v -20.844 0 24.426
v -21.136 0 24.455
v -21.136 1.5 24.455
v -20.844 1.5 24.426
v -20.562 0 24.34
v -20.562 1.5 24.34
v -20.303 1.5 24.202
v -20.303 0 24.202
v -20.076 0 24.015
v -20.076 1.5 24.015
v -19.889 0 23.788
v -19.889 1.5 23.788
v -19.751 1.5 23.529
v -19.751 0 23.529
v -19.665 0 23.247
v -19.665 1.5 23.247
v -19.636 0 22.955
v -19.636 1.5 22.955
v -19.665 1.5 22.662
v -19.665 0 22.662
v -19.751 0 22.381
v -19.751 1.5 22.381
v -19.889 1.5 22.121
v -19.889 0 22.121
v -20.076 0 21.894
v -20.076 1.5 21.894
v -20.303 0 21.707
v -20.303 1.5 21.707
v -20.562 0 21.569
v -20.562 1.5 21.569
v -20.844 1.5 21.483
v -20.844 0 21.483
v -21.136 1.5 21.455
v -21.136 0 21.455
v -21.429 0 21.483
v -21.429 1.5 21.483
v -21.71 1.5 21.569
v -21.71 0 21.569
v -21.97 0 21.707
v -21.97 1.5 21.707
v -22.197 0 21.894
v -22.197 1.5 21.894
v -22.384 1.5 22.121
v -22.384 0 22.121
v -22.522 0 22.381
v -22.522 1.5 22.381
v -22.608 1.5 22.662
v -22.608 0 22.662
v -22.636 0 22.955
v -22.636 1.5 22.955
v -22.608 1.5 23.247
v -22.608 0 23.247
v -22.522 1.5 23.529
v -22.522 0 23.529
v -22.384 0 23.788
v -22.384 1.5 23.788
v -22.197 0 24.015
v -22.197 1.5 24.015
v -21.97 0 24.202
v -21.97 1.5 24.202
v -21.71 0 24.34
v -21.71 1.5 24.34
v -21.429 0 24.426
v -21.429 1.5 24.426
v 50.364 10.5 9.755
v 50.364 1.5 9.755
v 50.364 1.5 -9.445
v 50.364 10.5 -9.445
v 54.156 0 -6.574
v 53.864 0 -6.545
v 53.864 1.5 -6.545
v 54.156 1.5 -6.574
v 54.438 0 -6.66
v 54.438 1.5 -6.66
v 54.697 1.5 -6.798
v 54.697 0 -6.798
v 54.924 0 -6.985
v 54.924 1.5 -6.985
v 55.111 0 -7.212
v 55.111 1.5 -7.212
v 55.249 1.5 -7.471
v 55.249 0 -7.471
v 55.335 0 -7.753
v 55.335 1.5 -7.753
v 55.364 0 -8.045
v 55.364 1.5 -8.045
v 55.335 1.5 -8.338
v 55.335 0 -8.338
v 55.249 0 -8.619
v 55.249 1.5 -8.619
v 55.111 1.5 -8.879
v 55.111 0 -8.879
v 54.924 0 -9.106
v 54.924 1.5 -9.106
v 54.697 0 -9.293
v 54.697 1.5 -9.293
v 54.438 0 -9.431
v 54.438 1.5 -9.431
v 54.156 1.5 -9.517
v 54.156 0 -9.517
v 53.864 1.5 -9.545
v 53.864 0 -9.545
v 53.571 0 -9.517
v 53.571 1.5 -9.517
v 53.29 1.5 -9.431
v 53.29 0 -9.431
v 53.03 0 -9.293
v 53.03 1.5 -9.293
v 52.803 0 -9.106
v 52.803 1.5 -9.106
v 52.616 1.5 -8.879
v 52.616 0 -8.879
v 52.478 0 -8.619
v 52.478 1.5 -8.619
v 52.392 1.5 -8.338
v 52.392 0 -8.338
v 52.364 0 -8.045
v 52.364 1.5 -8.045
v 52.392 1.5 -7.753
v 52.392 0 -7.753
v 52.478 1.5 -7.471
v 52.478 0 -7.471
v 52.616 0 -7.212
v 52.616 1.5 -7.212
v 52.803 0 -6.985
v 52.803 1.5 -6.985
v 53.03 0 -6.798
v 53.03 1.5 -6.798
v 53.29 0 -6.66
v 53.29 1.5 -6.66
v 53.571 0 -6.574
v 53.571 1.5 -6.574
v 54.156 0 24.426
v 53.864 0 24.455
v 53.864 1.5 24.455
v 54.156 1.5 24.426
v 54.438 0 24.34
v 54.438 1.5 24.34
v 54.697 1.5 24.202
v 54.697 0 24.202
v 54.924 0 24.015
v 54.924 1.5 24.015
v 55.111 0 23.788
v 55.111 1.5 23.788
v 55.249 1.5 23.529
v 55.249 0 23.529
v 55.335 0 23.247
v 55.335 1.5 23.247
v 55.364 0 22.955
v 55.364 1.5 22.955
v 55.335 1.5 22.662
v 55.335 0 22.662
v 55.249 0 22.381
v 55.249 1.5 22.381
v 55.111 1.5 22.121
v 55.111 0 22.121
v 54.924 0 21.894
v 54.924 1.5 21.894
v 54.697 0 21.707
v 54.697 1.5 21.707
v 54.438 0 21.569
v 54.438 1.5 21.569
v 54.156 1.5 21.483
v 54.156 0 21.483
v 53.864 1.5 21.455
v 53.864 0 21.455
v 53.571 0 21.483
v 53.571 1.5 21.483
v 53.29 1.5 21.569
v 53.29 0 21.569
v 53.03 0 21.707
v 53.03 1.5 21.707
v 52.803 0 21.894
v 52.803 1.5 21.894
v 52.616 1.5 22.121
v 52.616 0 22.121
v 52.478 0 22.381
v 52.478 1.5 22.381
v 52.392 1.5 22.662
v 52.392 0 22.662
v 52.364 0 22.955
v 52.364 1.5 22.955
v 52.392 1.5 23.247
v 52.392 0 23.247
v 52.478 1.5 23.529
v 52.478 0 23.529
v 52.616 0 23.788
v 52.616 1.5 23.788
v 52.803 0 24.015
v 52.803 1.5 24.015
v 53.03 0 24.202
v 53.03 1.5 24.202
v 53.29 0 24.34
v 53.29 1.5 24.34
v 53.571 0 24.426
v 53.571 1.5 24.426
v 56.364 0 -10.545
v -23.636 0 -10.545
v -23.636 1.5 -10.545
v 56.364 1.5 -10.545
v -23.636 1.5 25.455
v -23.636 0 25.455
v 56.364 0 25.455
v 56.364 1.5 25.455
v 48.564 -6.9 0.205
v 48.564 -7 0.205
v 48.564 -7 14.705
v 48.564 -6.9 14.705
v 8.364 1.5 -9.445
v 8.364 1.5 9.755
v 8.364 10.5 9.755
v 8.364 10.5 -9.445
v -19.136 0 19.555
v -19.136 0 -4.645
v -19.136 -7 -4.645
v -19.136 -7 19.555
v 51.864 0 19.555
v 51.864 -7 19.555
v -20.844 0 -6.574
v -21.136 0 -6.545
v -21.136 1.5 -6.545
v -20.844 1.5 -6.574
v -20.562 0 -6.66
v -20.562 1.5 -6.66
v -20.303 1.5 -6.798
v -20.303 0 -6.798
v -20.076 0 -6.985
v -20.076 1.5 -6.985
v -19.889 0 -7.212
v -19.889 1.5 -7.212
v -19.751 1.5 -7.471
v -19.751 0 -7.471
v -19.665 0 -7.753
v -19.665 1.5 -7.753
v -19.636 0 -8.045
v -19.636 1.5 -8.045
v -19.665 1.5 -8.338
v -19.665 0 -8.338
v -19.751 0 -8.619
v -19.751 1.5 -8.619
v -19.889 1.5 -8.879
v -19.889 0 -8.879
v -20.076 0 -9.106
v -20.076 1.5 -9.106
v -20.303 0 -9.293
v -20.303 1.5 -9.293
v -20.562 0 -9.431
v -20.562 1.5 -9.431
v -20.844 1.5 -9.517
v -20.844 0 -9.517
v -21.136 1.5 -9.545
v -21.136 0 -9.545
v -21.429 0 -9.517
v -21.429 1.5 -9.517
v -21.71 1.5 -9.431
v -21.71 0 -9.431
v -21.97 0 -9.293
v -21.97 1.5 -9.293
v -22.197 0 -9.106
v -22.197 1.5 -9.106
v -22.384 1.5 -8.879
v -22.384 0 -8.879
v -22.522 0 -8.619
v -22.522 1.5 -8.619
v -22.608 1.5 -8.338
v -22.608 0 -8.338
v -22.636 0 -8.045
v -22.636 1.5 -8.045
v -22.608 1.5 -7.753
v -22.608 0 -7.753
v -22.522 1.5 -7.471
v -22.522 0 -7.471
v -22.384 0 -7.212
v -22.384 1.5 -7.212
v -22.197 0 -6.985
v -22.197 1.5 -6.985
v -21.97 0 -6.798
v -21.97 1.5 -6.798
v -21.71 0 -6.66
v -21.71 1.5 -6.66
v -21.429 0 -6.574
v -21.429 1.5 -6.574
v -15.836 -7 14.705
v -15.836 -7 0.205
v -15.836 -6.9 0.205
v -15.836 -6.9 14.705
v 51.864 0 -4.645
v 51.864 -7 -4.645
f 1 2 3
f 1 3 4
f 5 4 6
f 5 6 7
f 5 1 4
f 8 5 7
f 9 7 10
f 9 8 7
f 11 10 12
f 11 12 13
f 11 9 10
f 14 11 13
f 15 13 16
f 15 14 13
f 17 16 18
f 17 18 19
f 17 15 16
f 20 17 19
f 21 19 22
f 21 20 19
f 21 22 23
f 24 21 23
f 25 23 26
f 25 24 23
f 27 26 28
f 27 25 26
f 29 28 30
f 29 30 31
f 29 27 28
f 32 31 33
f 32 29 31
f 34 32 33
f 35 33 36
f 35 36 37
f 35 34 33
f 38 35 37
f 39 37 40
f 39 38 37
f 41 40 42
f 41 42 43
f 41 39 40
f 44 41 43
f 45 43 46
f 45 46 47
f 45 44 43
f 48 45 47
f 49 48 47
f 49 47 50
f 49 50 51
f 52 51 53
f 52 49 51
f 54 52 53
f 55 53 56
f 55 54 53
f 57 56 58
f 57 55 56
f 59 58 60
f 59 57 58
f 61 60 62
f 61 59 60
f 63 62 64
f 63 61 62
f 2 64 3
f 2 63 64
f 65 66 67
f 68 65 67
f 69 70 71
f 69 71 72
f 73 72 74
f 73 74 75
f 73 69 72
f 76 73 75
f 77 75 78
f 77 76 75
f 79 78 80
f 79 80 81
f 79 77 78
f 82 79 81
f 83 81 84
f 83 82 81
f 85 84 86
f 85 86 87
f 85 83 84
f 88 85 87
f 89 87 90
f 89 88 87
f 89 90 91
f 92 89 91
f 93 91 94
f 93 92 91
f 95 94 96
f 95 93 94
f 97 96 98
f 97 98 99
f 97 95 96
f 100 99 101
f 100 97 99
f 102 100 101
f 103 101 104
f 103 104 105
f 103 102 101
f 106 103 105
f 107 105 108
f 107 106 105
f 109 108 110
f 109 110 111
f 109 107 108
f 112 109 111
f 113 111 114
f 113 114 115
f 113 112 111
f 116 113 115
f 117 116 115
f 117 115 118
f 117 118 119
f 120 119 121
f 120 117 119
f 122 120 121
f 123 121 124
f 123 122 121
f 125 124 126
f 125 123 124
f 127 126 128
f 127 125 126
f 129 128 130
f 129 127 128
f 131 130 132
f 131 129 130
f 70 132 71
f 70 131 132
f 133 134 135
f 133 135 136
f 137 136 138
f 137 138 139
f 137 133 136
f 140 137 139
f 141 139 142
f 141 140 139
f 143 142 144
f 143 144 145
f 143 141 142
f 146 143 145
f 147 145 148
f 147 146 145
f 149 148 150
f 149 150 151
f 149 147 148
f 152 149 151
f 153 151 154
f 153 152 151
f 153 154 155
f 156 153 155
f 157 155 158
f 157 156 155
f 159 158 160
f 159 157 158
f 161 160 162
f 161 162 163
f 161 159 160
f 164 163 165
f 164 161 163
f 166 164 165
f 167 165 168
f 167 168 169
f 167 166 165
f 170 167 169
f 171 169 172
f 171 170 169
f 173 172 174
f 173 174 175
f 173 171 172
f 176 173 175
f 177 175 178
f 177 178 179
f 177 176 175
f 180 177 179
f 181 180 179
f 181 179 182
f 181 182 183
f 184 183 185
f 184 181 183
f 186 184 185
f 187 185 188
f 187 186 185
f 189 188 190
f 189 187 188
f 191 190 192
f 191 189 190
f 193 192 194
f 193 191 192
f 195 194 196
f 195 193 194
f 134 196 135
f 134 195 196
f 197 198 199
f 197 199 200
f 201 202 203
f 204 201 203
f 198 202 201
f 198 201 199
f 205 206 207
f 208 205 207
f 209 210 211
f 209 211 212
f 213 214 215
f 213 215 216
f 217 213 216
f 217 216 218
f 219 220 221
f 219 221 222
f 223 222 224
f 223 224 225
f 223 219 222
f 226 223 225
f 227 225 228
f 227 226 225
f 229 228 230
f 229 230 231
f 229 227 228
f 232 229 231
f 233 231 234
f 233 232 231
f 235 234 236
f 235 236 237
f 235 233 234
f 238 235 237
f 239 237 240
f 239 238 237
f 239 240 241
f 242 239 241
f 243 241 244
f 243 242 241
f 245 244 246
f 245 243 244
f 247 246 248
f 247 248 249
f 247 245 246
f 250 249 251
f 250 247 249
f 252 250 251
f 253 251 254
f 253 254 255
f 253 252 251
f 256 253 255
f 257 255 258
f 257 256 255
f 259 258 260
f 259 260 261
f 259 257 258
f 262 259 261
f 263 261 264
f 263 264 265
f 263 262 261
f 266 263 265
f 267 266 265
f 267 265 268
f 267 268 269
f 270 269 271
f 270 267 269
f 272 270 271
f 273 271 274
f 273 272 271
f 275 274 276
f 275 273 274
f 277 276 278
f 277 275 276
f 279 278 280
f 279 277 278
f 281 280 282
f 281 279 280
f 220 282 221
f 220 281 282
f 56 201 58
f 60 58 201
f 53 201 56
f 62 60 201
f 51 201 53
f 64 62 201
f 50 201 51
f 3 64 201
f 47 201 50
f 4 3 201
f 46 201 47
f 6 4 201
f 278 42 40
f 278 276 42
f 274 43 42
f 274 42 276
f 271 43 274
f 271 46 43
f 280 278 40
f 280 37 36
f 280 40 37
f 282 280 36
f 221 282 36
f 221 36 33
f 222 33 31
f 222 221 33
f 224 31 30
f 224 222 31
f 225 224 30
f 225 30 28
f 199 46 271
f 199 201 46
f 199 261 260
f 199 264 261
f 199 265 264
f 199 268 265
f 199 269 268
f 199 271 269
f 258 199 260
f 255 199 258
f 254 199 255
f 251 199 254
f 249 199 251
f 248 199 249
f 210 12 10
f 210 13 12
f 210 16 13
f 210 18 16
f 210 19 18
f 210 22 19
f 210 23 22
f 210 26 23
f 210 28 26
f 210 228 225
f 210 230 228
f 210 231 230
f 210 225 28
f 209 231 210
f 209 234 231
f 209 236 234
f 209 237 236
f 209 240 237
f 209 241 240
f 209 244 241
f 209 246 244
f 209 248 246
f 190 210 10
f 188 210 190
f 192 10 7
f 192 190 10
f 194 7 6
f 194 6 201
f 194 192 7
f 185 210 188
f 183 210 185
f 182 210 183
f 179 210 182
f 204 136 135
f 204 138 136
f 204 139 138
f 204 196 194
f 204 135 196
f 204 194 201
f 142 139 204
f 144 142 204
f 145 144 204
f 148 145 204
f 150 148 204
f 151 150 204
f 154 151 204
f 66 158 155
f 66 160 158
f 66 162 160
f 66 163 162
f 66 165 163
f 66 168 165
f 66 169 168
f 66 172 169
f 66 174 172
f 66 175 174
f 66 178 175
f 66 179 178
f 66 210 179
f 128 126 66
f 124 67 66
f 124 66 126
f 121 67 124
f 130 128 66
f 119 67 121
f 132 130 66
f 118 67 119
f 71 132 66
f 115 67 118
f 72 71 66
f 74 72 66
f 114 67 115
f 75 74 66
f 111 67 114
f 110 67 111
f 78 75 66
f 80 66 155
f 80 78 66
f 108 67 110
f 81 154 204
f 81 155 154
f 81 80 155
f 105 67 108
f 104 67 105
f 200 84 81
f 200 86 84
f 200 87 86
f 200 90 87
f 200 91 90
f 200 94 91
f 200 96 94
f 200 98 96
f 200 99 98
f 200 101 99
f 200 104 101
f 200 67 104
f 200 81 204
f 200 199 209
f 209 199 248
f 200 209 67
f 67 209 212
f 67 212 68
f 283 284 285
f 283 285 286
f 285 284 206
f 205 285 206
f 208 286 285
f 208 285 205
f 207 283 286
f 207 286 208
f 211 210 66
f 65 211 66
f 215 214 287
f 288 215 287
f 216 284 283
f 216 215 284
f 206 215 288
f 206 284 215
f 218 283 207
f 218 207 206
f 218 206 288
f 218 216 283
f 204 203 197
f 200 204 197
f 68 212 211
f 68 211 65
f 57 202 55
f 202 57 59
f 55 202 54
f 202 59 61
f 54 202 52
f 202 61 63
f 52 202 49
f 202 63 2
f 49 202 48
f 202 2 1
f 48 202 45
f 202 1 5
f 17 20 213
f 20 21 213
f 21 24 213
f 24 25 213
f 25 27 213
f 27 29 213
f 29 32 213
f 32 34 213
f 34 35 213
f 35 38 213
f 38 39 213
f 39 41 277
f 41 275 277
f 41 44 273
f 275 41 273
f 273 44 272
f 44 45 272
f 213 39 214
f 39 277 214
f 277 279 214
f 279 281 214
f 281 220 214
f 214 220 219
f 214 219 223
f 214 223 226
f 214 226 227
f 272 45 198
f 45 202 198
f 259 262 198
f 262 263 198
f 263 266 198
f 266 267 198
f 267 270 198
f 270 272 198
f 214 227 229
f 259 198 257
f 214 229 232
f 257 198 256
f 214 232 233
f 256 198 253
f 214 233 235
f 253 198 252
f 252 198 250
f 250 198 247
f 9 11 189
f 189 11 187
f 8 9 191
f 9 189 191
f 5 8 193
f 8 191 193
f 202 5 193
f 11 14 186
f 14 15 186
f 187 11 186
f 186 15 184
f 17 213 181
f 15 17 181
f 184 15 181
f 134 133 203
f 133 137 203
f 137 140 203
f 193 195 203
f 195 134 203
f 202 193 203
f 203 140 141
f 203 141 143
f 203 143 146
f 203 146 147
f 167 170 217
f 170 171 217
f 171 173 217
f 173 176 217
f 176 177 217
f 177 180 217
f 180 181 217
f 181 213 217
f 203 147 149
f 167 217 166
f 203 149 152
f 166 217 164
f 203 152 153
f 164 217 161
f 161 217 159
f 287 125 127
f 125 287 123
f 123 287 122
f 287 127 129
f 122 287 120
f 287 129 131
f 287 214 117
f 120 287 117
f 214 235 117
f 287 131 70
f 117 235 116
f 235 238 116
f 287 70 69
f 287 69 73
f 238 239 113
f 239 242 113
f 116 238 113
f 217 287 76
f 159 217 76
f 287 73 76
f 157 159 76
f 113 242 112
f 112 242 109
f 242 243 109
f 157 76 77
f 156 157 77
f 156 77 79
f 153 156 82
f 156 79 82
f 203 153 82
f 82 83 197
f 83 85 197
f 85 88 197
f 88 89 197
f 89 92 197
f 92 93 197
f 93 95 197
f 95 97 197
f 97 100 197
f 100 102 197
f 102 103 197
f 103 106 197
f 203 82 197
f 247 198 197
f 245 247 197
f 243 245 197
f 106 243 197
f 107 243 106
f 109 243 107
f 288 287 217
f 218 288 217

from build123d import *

# Parameters (mm, degrees)
SKETCH_1_W          = 80
SKETCH_1_H          = 36
SKETCH_1_R          = 1.5
EXTRUDE_1_DEPTH     = 1.5
SKETCH_2_W          = 71
SKETCH_2_H          = 24.2
EXTRUDE_2_DEPTH     = 7
SKETCH_3_W          = 42
SKETCH_3_H          = 19.2
EXTRUDE_3_DEPTH     = 9
SKETCH_4_W          = 64.4
SKETCH_4_H          = 14.5
CUT_EXTRUDE_1_DEPTH = 0.1


with BuildPart() as part:
    # Эскиз1 → Бобышка-Вытянуть1 (new body)
    with BuildSketch(Plane(origin=(0, 0, 0), x_dir=(1, 0, 0), z_dir=(0, 1, 0))):
        with Locations((16.363636364, -7.454545455)):
            Rectangle(SKETCH_1_W, SKETCH_1_H)
        with Locations(Location((-21.136363636, -22.954545455, 0), (0, 0, 270))):
            Circle(SKETCH_1_R, mode=Mode.SUBTRACT)
        with Locations(Location((53.863636364, 8.045454545, 0), (0, 0, 270))):
            Circle(SKETCH_1_R, mode=Mode.SUBTRACT)
        with Locations(Location((-21.136363636, 8.045454545, 0), (0, 0, 270))):
            Circle(SKETCH_1_R, mode=Mode.SUBTRACT)
        with Locations(Location((53.863636364, -22.954545455, 0), (0, 0, 270))):
            Circle(SKETCH_1_R, mode=Mode.SUBTRACT)
    extrude(amount=EXTRUDE_1_DEPTH)

    # Эскиз2 → Бобышка-Вытянуть2 (add)
    with BuildSketch(Plane.XZ):
        with Locations((16.363636364, 7.454545455)):
            Rectangle(SKETCH_2_W, SKETCH_2_H)
    extrude(amount=EXTRUDE_2_DEPTH)

    # Эскиз3 → Бобышка-Вытянуть3 (add)
    with BuildSketch(Plane(origin=(0, 1.5, 0), x_dir=(1, 0, 0), z_dir=(0, 1, 0))):
        with Locations((29.363636364, -0.154545455)):
            Rectangle(SKETCH_3_W, SKETCH_3_H)
    extrude(amount=EXTRUDE_3_DEPTH)

    # Эскиз4 → Вырез-Вытянуть1 (cut)
    with BuildSketch(Plane.XZ.offset(7)):
        with Locations((16.363636364, 7.454545455)):
            Rectangle(SKETCH_4_W, SKETCH_4_H)
    extrude(amount=-CUT_EXTRUDE_1_DEPTH, mode=Mode.SUBTRACT)


solid = part.part
